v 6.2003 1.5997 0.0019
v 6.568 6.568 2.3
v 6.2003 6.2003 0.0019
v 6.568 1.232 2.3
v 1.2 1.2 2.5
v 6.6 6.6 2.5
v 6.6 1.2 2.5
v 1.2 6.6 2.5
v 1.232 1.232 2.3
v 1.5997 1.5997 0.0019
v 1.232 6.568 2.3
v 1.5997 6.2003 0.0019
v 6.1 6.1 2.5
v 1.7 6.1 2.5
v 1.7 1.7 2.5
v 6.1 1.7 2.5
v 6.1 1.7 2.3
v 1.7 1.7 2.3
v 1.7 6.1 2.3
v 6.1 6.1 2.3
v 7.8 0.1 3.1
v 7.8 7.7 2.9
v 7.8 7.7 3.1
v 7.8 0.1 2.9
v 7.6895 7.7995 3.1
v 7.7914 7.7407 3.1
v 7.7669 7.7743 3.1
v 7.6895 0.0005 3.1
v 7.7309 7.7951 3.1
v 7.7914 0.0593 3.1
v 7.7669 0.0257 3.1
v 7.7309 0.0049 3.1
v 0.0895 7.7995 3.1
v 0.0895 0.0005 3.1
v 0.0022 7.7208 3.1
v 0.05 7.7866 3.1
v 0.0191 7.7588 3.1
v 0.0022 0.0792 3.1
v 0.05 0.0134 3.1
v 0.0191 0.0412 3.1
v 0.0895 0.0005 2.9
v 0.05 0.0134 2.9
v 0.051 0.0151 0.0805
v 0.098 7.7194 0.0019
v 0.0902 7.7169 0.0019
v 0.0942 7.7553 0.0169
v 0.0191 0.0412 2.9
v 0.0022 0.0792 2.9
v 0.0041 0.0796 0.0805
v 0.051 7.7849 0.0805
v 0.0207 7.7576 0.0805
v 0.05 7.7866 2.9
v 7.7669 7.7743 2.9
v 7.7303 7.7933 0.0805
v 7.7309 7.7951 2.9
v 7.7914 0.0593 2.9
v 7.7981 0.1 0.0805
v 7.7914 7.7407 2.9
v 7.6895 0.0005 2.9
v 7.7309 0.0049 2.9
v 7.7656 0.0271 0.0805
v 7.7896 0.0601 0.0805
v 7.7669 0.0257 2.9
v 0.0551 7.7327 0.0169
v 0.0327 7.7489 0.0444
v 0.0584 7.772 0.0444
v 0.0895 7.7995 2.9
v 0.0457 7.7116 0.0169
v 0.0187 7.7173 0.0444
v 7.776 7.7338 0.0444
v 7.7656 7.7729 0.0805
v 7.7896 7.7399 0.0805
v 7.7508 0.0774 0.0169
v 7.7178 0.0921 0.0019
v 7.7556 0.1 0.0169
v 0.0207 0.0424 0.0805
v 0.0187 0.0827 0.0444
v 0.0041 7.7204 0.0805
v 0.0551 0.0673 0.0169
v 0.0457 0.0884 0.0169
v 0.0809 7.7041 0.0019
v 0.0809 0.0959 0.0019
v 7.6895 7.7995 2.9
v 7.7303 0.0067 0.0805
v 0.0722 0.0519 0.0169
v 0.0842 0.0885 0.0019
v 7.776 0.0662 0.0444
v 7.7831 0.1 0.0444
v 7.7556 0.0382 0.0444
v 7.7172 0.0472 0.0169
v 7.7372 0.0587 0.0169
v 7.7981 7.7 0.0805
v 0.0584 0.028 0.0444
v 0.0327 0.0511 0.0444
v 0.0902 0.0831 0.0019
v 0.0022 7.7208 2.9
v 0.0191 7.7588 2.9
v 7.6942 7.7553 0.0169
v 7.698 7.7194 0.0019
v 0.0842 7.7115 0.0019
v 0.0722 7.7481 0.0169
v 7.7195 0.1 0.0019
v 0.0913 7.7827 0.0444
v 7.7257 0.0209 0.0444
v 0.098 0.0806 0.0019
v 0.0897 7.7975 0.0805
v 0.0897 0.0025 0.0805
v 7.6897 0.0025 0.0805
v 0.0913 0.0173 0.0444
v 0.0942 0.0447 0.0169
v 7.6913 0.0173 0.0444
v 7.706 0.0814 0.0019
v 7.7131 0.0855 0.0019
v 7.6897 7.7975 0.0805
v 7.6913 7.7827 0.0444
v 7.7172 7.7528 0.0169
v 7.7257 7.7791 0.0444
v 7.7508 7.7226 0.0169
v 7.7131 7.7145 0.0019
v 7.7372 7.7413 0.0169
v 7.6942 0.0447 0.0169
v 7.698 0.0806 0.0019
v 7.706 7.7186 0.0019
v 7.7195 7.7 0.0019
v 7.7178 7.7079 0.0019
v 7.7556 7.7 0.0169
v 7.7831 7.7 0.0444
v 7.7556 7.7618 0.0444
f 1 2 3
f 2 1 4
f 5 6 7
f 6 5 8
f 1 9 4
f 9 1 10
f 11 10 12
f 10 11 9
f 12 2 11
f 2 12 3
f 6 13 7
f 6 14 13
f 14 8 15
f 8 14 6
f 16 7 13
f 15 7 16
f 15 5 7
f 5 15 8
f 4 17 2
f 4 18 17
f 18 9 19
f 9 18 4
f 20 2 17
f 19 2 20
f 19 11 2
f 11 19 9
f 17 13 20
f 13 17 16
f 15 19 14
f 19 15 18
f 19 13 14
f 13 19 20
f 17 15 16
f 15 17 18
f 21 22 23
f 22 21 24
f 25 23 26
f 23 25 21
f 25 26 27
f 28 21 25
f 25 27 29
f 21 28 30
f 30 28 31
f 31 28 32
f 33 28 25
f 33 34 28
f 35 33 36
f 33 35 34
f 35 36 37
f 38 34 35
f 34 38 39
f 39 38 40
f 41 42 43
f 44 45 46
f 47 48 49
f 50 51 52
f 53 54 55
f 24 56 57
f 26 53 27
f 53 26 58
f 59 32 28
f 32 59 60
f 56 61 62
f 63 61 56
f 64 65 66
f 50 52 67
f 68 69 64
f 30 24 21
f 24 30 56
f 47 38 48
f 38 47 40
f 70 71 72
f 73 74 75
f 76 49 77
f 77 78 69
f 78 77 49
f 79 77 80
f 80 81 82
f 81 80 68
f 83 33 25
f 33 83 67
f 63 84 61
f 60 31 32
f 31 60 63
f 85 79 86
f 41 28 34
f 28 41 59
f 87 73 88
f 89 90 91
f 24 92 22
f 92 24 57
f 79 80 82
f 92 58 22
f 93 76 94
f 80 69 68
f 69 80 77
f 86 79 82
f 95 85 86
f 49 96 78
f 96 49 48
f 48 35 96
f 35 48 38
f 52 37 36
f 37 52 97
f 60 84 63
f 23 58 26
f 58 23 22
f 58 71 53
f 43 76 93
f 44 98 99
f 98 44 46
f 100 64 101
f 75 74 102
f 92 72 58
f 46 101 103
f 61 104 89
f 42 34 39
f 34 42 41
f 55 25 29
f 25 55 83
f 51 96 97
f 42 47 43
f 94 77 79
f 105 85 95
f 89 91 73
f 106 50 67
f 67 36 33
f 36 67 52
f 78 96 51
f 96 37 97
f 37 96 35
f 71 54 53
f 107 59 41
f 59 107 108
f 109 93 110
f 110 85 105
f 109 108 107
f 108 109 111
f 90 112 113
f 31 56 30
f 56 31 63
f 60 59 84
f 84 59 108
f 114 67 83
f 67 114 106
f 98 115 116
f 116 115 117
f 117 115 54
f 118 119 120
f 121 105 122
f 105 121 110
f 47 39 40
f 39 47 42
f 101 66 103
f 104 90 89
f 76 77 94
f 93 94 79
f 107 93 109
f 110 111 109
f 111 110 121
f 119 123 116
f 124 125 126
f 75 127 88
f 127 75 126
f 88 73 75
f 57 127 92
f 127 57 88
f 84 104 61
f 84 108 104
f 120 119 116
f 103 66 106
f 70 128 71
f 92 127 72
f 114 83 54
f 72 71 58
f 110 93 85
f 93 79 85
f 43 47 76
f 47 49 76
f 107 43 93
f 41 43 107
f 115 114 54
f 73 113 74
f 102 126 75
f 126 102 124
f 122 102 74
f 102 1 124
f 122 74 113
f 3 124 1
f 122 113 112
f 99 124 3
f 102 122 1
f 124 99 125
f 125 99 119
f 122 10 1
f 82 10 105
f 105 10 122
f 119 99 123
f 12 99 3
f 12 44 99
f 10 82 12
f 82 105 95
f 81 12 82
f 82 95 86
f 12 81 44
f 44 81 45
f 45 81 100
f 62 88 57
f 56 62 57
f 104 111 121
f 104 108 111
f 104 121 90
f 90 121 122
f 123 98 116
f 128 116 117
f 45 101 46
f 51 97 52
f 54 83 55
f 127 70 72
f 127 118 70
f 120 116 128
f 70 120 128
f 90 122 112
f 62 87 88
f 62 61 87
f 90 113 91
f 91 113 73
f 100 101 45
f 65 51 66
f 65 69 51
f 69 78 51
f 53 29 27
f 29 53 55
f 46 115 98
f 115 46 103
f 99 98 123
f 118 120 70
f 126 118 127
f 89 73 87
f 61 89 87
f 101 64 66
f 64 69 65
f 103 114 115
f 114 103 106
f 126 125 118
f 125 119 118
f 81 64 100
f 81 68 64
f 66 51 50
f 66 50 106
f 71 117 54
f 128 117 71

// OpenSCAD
// file: ../../lib/brick-hollow.scad
/**
* Machine Blocks
* https://machinemania.net/blocks 
*
* Brick Hollow
* Copyright (c) 2022 Jan Philipp Knoeller <pk@pksoftware.de>
*
* Published under license:
* Creative Commons Attribution-NonCommercial-ShareAlike 4.0 International 
* https://creativecommons.org/licenses/by-nc-sa/4.0/
*
*/
echo(version=version());

module brickHollow(height=9.3, fade=2.5, minSize=[4.6,4.6], maxSize=[5.2, 5.2], center = false){
    echo(height, minSize, maxSize, fade);
    sizeX = max(minSize[0],maxSize[0]); 
   sizeY = max(minSize[1],maxSize[1]); 
    
    posX = center ? 0 : 0.5*sizeX; 
   posY = center ? 0 : 0.5*sizeY;   
   posZ = center ? -0.5 * (height-fade) : 0.5*fade;
    
    cutHelper = 0.2;
    overlapSpace=0.1;
    
    translate([posX, posY, posZ]){
        union(){
            polyhedron(points=[
                [-0.5*minSize[0],-0.5*minSize[1],-0.5*fade],
                [0.5*minSize[0],-0.5*minSize[1],-0.5*fade],
                [0.5*minSize[0],0.5*minSize[1],-0.5*fade],
                [-0.5*minSize[0],0.5*minSize[1],-0.5*fade],
                [-0.5*maxSize[0],-0.5*maxSize[1],0.5*fade],
                [0.5*maxSize[0],-0.5*maxSize[1],0.5*fade],
                [0.5*maxSize[0],0.5*maxSize[1],0.5*fade],
                [-0.5*maxSize[0],0.5*maxSize[1],0.5*fade]
            ], faces=[[0,1,2,3],[1,0,4,5],[2,1,5,6],[3,2,6,7],[0,3,7,4],[7,6,5,4]]);
            
            if(height > fade){
                translate([0,0,0.5*height - overlapSpace]){
                    cube([maxSize[0], maxSize[1], height - fade + overlapSpace], center=true);
                }
            }
            
            translate([0,0,-0.5*(fade + cutHelper) + overlapSpace]){
                cube([minSize[0], minSize[1], cutHelper + overlapSpace], center=true);
            }
        }
    }
}

//brickHollow(height=9.3, maxSize=[5.2,5.2], minSize=[4.6,4.6], center=true);
// file: ../../lib/roundedcube_simple.scad
/**
* Machine Blocks
* https://machinemania.net/blocks 
*
* Module for simple rounded cubes
* Copyright (c) 2022 Jan Philipp Knoeller <pk@pksoftware.de>
*
* Published under license:
* Creative Commons Attribution-NonCommercial-ShareAlike 4.0 International 
* https://creativecommons.org/licenses/by-nc-sa/4.0/
*
*/
module roundedcube_simple(size = [1, 1, 1], center = false, radius = 0.5, resolution = 20) {
	// If single value, convert to [x, y, z] vector
	size = (size[0] == undef) ? [size, size, size] : size;

	translate = (center == false) ?
		[radius, radius, radius] :
		[
			radius - (size[0] / 2),
			radius - (size[1] / 2),
			radius - (size[2] / 2)
	];

	translate(v = translate)
	minkowski() {
		cube(size = [
			size[0] - (radius * 2),
			size[1] - (radius * 2),
			size[2] - (radius * 2)
		]);
		sphere(r = radius, $fn = resolution);
	}
}
// file: ../../lib/roundedcube.scad
// More information: https://danielupshaw.com/openscad-rounded-corners/

// Set to 0.01 for higher definition curves (renders slower)
$fs = 0.15;

module roundedcube(size = [1, 1, 1], center = false, radius = 0.5, apply_to = "all", resolution = 20) {
	// If single value, convert to [x, y, z] vector
	size = (size[0] == undef) ? [size, size, size] : size;

	translate_min = radius;
	translate_xmax = size[0] - radius;
	translate_ymax = size[1] - radius;
	translate_zmax = size[2] - radius;

	diameter = radius * 2;

	obj_translate = (center == false) ?
		[0, 0, 0] : [
			-(size[0] / 2),
			-(size[1] / 2),
			-(size[2] / 2)
		];

	translate(v = obj_translate) {
		hull() {
			for (translate_x = [translate_min, translate_xmax]) {
				x_at = (translate_x == translate_min) ? "min" : "max";
				for (translate_y = [translate_min, translate_ymax]) {
					y_at = (translate_y == translate_min) ? "min" : "max";
					for (translate_z = [translate_min, translate_zmax]) {
						z_at = (translate_z == translate_min) ? "min" : "max";

						translate(v = [translate_x, translate_y, translate_z])
						if (
							(apply_to == "all") ||
							(apply_to == "xmin" && x_at == "min") || (apply_to == "xmax" && x_at == "max") ||
							(apply_to == "ymin" && y_at == "min") || (apply_to == "ymax" && y_at == "max") ||
							(apply_to == "zmin" && z_at == "min") || (apply_to == "zmax" && z_at == "max")
						) {
							sphere(r = radius, $fn = resolution);
						} else {
							rotate = 
								(apply_to == "xmin" || apply_to == "xmax" || apply_to == "x") ? [0, 90, 0] : (
								(apply_to == "ymin" || apply_to == "ymax" || apply_to == "y") ? [90, 90, 0] :
								[0, 0, 0]
							);
							rotate(a = rotate)
							cylinder(h = diameter, r = radius, center = true, $fn = resolution);
						}
					}
				}
			}
		}
	}
}
// main file
/**
* Machine Blocks
* https://machinemania.net/blocks 
*
* Plate 1x1 without knobs
* Copyright (c) 2022 Jan Philipp Knoeller <pk@pksoftware.de>
*
* Published under license:
* Creative Commons Attribution-NonCommercial-ShareAlike 4.0 International 
* https://creativecommons.org/licenses/by-nc-sa/4.0/
*
*/
echo(version=version());

include <../../lib/block-v2.scad>;

block(grid=[1,1], withKnobs=false);
